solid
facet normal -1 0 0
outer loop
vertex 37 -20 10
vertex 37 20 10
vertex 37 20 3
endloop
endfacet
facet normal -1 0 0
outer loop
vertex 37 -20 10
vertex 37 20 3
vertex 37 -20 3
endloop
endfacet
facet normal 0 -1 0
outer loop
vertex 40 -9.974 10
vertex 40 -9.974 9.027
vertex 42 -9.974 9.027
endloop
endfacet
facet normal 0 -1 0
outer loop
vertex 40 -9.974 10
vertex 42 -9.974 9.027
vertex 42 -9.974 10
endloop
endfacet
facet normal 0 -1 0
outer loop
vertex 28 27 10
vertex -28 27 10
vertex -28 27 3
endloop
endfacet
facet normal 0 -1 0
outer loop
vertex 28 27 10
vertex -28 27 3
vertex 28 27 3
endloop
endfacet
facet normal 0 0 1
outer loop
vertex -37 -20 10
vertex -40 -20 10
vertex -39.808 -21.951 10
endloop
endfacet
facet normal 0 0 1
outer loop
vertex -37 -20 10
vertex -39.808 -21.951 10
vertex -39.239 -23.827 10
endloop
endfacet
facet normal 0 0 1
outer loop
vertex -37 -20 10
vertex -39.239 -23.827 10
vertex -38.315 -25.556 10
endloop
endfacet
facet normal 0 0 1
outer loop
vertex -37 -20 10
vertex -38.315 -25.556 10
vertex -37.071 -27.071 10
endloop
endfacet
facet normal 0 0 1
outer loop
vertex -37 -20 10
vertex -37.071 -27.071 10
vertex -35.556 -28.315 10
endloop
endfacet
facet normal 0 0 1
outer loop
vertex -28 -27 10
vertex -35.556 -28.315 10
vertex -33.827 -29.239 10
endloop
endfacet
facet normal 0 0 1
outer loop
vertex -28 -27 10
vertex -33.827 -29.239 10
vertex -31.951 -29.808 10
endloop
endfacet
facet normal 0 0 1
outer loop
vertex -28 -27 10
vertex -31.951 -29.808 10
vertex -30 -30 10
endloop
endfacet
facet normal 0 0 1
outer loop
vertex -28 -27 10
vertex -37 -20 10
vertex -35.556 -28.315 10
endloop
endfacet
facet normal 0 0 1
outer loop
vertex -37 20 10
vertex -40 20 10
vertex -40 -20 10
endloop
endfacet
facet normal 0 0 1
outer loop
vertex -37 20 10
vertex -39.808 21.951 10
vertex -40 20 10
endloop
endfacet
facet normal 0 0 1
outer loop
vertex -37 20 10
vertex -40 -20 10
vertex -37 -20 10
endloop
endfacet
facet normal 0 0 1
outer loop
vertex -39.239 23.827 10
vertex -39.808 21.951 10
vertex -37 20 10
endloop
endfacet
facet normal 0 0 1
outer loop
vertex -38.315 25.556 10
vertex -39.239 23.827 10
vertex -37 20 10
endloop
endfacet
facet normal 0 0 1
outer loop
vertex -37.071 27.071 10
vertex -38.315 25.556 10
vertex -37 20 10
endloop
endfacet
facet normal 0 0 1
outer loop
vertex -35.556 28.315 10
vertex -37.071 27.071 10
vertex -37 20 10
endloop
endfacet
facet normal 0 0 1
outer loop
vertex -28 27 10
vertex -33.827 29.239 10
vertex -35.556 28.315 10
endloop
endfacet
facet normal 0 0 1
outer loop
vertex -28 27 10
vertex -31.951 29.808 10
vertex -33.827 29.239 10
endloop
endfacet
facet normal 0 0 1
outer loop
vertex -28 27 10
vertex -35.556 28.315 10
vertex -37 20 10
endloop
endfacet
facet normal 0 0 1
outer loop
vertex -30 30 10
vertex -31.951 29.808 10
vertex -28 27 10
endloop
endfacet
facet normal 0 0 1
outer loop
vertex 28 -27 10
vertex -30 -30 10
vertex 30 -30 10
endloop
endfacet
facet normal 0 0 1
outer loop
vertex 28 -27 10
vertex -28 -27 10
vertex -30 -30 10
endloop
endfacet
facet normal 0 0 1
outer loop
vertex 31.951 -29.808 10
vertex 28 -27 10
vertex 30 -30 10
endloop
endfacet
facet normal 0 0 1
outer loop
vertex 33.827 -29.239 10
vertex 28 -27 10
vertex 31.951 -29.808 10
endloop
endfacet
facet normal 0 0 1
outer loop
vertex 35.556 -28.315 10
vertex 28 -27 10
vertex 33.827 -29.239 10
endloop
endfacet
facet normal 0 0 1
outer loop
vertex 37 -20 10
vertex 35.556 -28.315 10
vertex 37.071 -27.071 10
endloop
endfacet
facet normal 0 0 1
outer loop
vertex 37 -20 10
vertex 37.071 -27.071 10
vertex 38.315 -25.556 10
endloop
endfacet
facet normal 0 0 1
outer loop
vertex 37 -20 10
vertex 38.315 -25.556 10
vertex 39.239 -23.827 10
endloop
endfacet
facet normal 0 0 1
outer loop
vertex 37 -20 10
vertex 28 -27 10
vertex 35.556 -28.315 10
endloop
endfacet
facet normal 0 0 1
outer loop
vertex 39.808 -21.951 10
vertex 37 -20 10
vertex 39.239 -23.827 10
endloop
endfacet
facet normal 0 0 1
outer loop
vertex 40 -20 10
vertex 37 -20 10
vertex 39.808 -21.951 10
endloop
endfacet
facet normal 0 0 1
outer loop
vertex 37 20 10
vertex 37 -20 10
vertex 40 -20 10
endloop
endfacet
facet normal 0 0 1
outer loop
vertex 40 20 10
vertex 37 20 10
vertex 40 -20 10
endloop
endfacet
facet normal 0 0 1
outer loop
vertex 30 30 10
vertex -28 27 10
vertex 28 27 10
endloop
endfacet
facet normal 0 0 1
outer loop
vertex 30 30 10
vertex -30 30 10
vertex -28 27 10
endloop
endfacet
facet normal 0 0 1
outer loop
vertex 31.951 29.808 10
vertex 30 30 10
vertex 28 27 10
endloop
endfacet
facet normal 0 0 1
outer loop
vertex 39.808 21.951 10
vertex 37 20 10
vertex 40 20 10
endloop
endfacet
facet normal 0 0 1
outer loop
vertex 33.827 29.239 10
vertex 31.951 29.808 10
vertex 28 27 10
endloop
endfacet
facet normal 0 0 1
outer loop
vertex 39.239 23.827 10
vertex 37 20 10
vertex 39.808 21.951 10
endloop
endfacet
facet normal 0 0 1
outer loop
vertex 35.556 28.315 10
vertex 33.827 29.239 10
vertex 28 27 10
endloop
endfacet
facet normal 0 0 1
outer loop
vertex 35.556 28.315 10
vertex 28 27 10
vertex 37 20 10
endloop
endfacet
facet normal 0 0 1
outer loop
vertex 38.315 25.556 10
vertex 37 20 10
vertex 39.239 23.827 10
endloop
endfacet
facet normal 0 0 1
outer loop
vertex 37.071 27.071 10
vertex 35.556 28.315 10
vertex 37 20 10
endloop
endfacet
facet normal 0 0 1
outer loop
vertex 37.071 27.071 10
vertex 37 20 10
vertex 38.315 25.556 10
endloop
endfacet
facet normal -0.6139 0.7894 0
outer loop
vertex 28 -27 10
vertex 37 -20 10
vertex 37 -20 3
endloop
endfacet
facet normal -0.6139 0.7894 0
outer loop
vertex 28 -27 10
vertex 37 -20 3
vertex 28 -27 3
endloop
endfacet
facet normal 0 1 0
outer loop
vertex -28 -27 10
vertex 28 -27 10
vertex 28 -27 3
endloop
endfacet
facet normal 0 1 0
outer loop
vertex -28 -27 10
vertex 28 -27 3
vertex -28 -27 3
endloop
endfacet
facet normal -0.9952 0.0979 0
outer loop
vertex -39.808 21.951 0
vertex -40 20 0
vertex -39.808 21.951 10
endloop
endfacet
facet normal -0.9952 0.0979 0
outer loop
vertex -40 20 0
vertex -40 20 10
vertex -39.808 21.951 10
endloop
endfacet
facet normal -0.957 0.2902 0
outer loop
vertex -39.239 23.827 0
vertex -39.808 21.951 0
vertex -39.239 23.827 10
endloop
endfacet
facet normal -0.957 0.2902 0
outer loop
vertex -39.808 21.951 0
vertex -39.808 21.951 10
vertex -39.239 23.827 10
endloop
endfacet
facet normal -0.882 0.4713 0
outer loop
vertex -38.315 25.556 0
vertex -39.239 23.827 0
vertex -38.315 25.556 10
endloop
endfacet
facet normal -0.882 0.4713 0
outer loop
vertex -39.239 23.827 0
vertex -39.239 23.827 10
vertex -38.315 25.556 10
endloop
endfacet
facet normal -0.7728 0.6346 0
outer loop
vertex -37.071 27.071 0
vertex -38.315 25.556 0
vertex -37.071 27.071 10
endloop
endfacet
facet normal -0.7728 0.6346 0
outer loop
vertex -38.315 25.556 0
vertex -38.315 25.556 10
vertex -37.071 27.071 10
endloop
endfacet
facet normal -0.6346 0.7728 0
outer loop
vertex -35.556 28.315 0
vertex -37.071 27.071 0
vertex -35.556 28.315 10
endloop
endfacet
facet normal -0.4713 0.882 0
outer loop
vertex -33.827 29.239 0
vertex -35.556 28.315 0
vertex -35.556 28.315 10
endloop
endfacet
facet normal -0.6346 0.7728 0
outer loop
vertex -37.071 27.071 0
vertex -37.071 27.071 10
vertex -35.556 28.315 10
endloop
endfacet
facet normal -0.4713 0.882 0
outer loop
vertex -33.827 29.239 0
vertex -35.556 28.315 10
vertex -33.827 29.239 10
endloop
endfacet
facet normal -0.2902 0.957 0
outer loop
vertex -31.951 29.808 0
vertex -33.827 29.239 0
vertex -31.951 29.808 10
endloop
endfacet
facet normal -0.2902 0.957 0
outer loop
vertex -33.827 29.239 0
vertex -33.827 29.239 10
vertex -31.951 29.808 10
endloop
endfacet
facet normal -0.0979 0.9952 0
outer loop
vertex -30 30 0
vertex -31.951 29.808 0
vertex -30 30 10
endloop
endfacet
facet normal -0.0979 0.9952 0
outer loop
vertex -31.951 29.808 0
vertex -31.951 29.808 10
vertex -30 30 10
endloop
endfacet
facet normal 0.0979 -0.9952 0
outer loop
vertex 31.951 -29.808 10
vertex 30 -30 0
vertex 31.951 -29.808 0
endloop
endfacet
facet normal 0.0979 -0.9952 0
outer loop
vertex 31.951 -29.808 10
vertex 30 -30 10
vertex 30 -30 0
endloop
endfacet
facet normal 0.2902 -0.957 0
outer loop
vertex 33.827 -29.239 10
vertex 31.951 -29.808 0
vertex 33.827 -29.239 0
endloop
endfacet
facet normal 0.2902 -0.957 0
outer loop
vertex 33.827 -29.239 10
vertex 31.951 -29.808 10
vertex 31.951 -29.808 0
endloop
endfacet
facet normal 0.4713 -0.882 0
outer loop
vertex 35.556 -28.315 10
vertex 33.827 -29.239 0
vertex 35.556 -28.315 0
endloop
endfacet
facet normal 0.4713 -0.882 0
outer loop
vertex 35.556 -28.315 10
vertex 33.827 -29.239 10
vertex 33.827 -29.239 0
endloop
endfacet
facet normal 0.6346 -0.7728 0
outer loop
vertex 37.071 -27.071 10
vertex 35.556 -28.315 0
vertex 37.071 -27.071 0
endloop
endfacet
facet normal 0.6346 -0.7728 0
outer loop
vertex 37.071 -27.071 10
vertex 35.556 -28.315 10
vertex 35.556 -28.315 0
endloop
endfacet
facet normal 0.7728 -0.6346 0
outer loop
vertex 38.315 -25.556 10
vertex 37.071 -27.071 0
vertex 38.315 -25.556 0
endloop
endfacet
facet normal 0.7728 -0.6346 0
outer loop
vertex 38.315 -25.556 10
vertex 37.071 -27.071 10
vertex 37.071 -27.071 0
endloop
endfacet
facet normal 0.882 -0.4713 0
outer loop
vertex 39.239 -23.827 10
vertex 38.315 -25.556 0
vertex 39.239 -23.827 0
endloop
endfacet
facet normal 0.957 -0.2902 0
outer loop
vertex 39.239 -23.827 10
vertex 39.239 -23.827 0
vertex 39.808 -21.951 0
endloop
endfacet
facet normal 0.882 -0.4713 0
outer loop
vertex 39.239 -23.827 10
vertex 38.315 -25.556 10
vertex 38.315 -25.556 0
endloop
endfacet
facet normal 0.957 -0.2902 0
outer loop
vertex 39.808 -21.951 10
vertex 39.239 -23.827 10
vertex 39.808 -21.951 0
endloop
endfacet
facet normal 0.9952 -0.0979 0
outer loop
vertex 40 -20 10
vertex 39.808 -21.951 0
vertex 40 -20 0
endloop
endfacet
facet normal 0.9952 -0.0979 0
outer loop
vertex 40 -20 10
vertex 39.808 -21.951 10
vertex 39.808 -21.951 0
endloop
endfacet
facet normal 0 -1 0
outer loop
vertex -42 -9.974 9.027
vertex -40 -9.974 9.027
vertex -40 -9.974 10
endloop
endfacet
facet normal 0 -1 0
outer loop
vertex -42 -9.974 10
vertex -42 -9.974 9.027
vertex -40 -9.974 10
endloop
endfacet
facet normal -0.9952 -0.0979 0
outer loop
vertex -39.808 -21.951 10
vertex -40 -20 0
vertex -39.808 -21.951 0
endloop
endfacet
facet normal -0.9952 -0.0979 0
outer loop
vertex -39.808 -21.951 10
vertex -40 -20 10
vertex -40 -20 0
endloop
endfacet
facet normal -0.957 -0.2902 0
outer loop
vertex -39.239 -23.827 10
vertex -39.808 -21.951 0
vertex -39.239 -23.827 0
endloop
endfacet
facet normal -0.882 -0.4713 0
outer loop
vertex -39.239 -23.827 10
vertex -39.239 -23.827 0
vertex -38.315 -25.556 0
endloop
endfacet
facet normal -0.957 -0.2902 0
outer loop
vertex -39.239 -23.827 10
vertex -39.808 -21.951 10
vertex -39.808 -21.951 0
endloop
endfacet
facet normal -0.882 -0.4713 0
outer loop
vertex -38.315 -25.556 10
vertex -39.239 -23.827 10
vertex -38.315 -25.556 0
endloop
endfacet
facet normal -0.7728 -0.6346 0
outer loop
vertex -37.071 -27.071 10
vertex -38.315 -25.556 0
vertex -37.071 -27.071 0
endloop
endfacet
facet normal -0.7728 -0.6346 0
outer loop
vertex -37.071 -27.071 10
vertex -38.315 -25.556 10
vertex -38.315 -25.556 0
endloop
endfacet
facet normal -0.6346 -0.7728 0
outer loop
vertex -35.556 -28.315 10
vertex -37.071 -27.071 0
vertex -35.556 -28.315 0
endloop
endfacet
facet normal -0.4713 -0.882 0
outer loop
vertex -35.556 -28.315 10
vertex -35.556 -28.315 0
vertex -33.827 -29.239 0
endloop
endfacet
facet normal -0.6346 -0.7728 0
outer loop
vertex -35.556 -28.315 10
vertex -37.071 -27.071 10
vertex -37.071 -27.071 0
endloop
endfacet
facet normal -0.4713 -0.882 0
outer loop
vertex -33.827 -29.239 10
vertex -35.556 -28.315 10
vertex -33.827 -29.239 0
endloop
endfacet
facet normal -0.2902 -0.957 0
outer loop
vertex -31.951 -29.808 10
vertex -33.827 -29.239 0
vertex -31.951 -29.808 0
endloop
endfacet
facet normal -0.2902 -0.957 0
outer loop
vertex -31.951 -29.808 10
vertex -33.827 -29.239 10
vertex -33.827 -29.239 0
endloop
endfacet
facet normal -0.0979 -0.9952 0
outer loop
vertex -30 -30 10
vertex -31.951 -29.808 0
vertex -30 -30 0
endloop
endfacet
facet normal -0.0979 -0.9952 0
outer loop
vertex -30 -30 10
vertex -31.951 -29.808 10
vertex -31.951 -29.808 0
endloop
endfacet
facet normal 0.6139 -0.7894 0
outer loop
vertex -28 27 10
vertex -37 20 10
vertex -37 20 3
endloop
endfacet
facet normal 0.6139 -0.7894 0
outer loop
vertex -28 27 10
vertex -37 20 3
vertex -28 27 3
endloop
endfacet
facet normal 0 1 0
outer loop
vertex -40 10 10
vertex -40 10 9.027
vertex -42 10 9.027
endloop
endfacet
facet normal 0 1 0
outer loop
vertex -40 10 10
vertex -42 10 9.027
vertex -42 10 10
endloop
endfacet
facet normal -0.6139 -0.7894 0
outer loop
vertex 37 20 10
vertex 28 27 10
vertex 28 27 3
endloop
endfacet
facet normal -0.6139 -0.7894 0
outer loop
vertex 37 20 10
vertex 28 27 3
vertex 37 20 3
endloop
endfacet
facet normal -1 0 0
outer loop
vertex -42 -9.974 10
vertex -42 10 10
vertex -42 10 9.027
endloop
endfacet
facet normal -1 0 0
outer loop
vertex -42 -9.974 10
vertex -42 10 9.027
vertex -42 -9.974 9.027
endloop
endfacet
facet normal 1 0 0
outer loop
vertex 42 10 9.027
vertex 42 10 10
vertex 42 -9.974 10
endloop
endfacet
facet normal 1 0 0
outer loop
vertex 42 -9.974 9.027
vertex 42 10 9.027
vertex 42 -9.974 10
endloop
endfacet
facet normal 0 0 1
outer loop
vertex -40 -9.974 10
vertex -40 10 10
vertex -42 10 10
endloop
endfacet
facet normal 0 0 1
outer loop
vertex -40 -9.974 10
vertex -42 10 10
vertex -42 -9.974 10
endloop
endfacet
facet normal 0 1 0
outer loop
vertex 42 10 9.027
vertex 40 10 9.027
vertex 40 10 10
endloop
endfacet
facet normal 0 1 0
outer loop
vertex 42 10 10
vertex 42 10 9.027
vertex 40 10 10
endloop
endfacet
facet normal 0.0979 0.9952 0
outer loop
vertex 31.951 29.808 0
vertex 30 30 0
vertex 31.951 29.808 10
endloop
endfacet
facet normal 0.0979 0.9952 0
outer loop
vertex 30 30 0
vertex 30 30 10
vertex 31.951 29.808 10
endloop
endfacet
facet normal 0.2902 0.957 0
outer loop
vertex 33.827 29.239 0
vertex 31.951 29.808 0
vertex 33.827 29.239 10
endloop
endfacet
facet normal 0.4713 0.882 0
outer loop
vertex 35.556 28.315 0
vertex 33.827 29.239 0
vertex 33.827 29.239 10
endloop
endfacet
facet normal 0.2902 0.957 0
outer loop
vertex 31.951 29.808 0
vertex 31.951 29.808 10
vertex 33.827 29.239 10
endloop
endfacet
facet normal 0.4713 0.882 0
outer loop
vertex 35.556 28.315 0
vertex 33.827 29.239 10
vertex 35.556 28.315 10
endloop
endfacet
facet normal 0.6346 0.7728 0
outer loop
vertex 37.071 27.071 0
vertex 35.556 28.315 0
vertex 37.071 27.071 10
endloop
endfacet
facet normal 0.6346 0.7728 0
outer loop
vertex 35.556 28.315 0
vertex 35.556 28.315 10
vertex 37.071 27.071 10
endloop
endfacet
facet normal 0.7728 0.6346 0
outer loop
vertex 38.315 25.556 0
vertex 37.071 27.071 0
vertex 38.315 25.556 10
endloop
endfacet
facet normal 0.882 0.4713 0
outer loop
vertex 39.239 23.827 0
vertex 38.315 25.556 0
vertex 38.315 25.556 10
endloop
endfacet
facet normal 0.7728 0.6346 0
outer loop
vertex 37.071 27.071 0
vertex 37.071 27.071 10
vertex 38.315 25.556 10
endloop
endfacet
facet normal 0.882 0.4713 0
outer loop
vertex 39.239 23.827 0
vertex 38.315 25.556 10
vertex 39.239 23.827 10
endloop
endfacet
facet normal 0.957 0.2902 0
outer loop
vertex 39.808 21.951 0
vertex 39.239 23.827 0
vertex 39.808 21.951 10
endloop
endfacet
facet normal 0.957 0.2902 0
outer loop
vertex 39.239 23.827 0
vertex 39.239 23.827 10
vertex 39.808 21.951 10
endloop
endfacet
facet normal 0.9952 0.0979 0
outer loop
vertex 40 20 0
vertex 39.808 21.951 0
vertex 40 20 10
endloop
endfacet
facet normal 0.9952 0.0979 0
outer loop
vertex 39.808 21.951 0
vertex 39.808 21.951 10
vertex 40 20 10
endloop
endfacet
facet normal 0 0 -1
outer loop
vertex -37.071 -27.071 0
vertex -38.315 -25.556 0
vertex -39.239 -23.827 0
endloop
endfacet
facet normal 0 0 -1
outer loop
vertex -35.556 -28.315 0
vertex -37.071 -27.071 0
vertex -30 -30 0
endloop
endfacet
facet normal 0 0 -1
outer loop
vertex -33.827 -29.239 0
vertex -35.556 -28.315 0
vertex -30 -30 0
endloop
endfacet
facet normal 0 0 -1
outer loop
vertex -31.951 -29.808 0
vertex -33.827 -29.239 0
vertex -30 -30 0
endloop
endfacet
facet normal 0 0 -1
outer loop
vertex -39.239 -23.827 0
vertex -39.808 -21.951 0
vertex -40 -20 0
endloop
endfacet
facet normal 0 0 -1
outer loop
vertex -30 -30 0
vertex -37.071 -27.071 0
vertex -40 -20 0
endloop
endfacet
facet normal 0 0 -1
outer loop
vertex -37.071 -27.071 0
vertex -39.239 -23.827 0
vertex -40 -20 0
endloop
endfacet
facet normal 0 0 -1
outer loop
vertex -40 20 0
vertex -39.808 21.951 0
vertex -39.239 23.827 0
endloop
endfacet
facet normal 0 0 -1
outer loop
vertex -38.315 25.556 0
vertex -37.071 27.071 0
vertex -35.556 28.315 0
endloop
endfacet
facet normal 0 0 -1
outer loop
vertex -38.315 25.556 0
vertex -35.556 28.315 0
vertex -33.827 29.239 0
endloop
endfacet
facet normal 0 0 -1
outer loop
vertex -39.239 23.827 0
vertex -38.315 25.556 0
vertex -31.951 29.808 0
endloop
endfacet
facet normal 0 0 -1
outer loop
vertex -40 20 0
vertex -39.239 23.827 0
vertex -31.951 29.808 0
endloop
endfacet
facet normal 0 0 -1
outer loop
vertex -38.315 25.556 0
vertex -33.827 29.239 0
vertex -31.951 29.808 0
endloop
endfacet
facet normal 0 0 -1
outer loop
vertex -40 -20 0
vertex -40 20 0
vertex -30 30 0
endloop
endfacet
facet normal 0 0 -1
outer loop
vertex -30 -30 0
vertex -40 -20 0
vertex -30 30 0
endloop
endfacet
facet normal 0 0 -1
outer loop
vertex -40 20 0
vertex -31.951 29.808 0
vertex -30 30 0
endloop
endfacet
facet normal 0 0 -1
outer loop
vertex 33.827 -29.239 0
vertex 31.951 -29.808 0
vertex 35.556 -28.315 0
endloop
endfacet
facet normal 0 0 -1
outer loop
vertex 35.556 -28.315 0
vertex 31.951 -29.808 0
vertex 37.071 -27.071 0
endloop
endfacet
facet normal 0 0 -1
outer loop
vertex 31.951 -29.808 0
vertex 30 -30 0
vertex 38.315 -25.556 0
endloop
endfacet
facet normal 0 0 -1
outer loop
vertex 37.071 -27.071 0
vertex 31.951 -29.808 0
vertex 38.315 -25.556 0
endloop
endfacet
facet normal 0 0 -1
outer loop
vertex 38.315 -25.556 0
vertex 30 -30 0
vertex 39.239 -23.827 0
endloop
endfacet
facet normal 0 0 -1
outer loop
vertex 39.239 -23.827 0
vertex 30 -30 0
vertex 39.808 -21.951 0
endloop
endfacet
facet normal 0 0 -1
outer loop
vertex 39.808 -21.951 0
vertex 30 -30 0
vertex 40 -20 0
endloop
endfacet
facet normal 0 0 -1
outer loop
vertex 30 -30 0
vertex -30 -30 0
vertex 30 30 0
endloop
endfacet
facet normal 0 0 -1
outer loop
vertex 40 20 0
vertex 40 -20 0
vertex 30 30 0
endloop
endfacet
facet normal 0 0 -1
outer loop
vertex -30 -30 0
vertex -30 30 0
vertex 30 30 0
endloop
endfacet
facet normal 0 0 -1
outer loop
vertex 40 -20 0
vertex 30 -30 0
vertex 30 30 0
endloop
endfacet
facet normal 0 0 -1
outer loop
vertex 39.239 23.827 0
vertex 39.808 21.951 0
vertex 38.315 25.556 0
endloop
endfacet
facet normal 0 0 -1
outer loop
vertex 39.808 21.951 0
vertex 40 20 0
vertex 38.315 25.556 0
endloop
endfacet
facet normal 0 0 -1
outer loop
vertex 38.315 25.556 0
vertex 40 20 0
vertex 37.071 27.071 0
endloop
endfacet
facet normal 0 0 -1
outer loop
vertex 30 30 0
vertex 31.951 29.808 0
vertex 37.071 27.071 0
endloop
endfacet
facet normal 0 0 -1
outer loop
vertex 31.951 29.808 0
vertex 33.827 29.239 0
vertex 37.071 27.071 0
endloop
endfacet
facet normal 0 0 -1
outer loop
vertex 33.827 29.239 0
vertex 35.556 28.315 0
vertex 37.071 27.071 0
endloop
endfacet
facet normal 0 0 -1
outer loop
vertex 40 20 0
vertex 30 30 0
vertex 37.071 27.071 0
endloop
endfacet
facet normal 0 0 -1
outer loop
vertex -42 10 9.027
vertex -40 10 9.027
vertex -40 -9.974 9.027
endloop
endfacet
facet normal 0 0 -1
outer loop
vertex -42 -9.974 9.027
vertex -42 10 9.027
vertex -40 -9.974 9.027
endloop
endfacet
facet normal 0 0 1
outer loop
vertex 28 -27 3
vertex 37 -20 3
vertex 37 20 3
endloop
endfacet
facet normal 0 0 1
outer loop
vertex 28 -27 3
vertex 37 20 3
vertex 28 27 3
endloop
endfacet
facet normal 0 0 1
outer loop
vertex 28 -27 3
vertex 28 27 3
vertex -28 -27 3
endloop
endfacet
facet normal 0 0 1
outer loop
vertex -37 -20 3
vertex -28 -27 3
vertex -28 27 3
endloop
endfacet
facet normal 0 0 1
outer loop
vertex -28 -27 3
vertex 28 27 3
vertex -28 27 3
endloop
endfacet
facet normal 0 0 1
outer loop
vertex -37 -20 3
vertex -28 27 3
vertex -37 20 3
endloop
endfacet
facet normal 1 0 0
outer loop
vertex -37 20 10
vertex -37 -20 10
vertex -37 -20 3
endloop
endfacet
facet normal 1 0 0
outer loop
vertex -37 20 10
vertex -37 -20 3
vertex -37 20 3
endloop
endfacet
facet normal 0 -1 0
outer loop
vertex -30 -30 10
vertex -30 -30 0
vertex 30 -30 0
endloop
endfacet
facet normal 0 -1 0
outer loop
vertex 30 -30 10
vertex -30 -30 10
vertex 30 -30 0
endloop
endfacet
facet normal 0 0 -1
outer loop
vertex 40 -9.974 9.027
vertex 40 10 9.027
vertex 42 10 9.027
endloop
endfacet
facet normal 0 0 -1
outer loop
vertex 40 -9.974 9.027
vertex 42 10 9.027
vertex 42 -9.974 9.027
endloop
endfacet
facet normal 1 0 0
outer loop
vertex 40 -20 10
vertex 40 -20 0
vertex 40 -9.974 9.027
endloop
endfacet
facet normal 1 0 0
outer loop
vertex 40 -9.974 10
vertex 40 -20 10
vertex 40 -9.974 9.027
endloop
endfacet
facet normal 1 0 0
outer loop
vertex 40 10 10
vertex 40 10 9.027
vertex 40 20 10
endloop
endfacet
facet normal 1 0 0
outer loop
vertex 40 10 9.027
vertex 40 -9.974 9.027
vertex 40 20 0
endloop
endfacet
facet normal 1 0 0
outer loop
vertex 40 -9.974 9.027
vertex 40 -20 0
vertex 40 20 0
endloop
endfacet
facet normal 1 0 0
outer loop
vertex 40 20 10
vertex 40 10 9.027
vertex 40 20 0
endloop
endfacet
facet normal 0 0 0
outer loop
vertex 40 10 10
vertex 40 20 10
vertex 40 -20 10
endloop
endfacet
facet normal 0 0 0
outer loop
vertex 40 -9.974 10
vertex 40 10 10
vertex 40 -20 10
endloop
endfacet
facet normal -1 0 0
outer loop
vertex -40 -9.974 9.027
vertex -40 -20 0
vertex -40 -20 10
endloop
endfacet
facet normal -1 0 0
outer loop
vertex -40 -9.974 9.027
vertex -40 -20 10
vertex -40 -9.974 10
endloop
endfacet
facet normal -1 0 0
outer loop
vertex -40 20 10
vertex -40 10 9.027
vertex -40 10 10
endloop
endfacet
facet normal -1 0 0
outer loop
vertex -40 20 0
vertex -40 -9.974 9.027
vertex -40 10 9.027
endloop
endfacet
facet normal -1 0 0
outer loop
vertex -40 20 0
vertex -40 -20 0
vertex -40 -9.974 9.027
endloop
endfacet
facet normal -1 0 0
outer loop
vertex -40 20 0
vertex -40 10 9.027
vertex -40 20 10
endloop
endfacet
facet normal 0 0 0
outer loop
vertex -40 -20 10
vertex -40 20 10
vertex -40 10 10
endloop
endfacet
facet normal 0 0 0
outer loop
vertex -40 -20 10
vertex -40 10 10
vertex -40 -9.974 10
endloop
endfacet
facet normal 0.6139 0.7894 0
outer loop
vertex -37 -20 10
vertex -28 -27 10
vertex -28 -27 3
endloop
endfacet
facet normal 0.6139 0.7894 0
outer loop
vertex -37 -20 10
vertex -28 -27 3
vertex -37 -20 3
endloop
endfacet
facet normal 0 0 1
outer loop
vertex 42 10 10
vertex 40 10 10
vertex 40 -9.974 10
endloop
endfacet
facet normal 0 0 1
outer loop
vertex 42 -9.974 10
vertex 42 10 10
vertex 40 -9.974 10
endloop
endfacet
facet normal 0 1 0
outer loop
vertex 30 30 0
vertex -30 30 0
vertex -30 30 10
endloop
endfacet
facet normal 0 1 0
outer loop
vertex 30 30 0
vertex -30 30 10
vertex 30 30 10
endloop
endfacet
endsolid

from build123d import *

# Parameters (mm, degrees)
SKETCH_W     = 80
SKETCH_H     = 60
PAD_DEPTH    = 10
POCKET_DEPTH = 7
FILLET001_R  = 10
SKETCH003_W  = 19.974239
SKETCH003_H  = 0.973365
PAD001_DEPTH = 2


with BuildPart() as part:
    # Sketch → Pad (new body)
    with BuildSketch(Plane.XY):
        Rectangle(SKETCH_W, SKETCH_H)
    extrude(amount=PAD_DEPTH)

    # Sketch002 (on Face6 of Pad) → Pocket (cut)
    with BuildSketch(Plane.XY.offset(10)):
        Polygon((-28, 27), (28, 27), (37, 20.000019), (37, -20.000019), (28, -27), (-28, -27), (-37, -20.000019), (-37, 20.000019), align=None)
    extrude(amount=-POCKET_DEPTH, mode=Mode.SUBTRACT)

    # Fillet001
    fillet001_edges = [part.edges().sort_by_distance(p)[0] for p in [
        (-40, 30, 5),
        (40, 30, 5),
        (40, -30, 5),
        (-40, -30, 5),
    ]]
    fillet(fillet001_edges, radius=FILLET001_R)

    # Sketch003 (on Face6 of Fillet001) → Pad001 (join)
    with BuildSketch(Plane(origin=(-40, 0, 0), x_dir=(0, -1, 0), z_dir=(-1, 0, 0))):
        with Locations((-0.012881, 9.513317)):
            Rectangle(SKETCH003_W, SKETCH003_H)
    pad001 = extrude(amount=PAD001_DEPTH)

    # Mirrored: Pad001 across YZ
    add(pad001.mirror(Plane.YZ))


solid = part.part
